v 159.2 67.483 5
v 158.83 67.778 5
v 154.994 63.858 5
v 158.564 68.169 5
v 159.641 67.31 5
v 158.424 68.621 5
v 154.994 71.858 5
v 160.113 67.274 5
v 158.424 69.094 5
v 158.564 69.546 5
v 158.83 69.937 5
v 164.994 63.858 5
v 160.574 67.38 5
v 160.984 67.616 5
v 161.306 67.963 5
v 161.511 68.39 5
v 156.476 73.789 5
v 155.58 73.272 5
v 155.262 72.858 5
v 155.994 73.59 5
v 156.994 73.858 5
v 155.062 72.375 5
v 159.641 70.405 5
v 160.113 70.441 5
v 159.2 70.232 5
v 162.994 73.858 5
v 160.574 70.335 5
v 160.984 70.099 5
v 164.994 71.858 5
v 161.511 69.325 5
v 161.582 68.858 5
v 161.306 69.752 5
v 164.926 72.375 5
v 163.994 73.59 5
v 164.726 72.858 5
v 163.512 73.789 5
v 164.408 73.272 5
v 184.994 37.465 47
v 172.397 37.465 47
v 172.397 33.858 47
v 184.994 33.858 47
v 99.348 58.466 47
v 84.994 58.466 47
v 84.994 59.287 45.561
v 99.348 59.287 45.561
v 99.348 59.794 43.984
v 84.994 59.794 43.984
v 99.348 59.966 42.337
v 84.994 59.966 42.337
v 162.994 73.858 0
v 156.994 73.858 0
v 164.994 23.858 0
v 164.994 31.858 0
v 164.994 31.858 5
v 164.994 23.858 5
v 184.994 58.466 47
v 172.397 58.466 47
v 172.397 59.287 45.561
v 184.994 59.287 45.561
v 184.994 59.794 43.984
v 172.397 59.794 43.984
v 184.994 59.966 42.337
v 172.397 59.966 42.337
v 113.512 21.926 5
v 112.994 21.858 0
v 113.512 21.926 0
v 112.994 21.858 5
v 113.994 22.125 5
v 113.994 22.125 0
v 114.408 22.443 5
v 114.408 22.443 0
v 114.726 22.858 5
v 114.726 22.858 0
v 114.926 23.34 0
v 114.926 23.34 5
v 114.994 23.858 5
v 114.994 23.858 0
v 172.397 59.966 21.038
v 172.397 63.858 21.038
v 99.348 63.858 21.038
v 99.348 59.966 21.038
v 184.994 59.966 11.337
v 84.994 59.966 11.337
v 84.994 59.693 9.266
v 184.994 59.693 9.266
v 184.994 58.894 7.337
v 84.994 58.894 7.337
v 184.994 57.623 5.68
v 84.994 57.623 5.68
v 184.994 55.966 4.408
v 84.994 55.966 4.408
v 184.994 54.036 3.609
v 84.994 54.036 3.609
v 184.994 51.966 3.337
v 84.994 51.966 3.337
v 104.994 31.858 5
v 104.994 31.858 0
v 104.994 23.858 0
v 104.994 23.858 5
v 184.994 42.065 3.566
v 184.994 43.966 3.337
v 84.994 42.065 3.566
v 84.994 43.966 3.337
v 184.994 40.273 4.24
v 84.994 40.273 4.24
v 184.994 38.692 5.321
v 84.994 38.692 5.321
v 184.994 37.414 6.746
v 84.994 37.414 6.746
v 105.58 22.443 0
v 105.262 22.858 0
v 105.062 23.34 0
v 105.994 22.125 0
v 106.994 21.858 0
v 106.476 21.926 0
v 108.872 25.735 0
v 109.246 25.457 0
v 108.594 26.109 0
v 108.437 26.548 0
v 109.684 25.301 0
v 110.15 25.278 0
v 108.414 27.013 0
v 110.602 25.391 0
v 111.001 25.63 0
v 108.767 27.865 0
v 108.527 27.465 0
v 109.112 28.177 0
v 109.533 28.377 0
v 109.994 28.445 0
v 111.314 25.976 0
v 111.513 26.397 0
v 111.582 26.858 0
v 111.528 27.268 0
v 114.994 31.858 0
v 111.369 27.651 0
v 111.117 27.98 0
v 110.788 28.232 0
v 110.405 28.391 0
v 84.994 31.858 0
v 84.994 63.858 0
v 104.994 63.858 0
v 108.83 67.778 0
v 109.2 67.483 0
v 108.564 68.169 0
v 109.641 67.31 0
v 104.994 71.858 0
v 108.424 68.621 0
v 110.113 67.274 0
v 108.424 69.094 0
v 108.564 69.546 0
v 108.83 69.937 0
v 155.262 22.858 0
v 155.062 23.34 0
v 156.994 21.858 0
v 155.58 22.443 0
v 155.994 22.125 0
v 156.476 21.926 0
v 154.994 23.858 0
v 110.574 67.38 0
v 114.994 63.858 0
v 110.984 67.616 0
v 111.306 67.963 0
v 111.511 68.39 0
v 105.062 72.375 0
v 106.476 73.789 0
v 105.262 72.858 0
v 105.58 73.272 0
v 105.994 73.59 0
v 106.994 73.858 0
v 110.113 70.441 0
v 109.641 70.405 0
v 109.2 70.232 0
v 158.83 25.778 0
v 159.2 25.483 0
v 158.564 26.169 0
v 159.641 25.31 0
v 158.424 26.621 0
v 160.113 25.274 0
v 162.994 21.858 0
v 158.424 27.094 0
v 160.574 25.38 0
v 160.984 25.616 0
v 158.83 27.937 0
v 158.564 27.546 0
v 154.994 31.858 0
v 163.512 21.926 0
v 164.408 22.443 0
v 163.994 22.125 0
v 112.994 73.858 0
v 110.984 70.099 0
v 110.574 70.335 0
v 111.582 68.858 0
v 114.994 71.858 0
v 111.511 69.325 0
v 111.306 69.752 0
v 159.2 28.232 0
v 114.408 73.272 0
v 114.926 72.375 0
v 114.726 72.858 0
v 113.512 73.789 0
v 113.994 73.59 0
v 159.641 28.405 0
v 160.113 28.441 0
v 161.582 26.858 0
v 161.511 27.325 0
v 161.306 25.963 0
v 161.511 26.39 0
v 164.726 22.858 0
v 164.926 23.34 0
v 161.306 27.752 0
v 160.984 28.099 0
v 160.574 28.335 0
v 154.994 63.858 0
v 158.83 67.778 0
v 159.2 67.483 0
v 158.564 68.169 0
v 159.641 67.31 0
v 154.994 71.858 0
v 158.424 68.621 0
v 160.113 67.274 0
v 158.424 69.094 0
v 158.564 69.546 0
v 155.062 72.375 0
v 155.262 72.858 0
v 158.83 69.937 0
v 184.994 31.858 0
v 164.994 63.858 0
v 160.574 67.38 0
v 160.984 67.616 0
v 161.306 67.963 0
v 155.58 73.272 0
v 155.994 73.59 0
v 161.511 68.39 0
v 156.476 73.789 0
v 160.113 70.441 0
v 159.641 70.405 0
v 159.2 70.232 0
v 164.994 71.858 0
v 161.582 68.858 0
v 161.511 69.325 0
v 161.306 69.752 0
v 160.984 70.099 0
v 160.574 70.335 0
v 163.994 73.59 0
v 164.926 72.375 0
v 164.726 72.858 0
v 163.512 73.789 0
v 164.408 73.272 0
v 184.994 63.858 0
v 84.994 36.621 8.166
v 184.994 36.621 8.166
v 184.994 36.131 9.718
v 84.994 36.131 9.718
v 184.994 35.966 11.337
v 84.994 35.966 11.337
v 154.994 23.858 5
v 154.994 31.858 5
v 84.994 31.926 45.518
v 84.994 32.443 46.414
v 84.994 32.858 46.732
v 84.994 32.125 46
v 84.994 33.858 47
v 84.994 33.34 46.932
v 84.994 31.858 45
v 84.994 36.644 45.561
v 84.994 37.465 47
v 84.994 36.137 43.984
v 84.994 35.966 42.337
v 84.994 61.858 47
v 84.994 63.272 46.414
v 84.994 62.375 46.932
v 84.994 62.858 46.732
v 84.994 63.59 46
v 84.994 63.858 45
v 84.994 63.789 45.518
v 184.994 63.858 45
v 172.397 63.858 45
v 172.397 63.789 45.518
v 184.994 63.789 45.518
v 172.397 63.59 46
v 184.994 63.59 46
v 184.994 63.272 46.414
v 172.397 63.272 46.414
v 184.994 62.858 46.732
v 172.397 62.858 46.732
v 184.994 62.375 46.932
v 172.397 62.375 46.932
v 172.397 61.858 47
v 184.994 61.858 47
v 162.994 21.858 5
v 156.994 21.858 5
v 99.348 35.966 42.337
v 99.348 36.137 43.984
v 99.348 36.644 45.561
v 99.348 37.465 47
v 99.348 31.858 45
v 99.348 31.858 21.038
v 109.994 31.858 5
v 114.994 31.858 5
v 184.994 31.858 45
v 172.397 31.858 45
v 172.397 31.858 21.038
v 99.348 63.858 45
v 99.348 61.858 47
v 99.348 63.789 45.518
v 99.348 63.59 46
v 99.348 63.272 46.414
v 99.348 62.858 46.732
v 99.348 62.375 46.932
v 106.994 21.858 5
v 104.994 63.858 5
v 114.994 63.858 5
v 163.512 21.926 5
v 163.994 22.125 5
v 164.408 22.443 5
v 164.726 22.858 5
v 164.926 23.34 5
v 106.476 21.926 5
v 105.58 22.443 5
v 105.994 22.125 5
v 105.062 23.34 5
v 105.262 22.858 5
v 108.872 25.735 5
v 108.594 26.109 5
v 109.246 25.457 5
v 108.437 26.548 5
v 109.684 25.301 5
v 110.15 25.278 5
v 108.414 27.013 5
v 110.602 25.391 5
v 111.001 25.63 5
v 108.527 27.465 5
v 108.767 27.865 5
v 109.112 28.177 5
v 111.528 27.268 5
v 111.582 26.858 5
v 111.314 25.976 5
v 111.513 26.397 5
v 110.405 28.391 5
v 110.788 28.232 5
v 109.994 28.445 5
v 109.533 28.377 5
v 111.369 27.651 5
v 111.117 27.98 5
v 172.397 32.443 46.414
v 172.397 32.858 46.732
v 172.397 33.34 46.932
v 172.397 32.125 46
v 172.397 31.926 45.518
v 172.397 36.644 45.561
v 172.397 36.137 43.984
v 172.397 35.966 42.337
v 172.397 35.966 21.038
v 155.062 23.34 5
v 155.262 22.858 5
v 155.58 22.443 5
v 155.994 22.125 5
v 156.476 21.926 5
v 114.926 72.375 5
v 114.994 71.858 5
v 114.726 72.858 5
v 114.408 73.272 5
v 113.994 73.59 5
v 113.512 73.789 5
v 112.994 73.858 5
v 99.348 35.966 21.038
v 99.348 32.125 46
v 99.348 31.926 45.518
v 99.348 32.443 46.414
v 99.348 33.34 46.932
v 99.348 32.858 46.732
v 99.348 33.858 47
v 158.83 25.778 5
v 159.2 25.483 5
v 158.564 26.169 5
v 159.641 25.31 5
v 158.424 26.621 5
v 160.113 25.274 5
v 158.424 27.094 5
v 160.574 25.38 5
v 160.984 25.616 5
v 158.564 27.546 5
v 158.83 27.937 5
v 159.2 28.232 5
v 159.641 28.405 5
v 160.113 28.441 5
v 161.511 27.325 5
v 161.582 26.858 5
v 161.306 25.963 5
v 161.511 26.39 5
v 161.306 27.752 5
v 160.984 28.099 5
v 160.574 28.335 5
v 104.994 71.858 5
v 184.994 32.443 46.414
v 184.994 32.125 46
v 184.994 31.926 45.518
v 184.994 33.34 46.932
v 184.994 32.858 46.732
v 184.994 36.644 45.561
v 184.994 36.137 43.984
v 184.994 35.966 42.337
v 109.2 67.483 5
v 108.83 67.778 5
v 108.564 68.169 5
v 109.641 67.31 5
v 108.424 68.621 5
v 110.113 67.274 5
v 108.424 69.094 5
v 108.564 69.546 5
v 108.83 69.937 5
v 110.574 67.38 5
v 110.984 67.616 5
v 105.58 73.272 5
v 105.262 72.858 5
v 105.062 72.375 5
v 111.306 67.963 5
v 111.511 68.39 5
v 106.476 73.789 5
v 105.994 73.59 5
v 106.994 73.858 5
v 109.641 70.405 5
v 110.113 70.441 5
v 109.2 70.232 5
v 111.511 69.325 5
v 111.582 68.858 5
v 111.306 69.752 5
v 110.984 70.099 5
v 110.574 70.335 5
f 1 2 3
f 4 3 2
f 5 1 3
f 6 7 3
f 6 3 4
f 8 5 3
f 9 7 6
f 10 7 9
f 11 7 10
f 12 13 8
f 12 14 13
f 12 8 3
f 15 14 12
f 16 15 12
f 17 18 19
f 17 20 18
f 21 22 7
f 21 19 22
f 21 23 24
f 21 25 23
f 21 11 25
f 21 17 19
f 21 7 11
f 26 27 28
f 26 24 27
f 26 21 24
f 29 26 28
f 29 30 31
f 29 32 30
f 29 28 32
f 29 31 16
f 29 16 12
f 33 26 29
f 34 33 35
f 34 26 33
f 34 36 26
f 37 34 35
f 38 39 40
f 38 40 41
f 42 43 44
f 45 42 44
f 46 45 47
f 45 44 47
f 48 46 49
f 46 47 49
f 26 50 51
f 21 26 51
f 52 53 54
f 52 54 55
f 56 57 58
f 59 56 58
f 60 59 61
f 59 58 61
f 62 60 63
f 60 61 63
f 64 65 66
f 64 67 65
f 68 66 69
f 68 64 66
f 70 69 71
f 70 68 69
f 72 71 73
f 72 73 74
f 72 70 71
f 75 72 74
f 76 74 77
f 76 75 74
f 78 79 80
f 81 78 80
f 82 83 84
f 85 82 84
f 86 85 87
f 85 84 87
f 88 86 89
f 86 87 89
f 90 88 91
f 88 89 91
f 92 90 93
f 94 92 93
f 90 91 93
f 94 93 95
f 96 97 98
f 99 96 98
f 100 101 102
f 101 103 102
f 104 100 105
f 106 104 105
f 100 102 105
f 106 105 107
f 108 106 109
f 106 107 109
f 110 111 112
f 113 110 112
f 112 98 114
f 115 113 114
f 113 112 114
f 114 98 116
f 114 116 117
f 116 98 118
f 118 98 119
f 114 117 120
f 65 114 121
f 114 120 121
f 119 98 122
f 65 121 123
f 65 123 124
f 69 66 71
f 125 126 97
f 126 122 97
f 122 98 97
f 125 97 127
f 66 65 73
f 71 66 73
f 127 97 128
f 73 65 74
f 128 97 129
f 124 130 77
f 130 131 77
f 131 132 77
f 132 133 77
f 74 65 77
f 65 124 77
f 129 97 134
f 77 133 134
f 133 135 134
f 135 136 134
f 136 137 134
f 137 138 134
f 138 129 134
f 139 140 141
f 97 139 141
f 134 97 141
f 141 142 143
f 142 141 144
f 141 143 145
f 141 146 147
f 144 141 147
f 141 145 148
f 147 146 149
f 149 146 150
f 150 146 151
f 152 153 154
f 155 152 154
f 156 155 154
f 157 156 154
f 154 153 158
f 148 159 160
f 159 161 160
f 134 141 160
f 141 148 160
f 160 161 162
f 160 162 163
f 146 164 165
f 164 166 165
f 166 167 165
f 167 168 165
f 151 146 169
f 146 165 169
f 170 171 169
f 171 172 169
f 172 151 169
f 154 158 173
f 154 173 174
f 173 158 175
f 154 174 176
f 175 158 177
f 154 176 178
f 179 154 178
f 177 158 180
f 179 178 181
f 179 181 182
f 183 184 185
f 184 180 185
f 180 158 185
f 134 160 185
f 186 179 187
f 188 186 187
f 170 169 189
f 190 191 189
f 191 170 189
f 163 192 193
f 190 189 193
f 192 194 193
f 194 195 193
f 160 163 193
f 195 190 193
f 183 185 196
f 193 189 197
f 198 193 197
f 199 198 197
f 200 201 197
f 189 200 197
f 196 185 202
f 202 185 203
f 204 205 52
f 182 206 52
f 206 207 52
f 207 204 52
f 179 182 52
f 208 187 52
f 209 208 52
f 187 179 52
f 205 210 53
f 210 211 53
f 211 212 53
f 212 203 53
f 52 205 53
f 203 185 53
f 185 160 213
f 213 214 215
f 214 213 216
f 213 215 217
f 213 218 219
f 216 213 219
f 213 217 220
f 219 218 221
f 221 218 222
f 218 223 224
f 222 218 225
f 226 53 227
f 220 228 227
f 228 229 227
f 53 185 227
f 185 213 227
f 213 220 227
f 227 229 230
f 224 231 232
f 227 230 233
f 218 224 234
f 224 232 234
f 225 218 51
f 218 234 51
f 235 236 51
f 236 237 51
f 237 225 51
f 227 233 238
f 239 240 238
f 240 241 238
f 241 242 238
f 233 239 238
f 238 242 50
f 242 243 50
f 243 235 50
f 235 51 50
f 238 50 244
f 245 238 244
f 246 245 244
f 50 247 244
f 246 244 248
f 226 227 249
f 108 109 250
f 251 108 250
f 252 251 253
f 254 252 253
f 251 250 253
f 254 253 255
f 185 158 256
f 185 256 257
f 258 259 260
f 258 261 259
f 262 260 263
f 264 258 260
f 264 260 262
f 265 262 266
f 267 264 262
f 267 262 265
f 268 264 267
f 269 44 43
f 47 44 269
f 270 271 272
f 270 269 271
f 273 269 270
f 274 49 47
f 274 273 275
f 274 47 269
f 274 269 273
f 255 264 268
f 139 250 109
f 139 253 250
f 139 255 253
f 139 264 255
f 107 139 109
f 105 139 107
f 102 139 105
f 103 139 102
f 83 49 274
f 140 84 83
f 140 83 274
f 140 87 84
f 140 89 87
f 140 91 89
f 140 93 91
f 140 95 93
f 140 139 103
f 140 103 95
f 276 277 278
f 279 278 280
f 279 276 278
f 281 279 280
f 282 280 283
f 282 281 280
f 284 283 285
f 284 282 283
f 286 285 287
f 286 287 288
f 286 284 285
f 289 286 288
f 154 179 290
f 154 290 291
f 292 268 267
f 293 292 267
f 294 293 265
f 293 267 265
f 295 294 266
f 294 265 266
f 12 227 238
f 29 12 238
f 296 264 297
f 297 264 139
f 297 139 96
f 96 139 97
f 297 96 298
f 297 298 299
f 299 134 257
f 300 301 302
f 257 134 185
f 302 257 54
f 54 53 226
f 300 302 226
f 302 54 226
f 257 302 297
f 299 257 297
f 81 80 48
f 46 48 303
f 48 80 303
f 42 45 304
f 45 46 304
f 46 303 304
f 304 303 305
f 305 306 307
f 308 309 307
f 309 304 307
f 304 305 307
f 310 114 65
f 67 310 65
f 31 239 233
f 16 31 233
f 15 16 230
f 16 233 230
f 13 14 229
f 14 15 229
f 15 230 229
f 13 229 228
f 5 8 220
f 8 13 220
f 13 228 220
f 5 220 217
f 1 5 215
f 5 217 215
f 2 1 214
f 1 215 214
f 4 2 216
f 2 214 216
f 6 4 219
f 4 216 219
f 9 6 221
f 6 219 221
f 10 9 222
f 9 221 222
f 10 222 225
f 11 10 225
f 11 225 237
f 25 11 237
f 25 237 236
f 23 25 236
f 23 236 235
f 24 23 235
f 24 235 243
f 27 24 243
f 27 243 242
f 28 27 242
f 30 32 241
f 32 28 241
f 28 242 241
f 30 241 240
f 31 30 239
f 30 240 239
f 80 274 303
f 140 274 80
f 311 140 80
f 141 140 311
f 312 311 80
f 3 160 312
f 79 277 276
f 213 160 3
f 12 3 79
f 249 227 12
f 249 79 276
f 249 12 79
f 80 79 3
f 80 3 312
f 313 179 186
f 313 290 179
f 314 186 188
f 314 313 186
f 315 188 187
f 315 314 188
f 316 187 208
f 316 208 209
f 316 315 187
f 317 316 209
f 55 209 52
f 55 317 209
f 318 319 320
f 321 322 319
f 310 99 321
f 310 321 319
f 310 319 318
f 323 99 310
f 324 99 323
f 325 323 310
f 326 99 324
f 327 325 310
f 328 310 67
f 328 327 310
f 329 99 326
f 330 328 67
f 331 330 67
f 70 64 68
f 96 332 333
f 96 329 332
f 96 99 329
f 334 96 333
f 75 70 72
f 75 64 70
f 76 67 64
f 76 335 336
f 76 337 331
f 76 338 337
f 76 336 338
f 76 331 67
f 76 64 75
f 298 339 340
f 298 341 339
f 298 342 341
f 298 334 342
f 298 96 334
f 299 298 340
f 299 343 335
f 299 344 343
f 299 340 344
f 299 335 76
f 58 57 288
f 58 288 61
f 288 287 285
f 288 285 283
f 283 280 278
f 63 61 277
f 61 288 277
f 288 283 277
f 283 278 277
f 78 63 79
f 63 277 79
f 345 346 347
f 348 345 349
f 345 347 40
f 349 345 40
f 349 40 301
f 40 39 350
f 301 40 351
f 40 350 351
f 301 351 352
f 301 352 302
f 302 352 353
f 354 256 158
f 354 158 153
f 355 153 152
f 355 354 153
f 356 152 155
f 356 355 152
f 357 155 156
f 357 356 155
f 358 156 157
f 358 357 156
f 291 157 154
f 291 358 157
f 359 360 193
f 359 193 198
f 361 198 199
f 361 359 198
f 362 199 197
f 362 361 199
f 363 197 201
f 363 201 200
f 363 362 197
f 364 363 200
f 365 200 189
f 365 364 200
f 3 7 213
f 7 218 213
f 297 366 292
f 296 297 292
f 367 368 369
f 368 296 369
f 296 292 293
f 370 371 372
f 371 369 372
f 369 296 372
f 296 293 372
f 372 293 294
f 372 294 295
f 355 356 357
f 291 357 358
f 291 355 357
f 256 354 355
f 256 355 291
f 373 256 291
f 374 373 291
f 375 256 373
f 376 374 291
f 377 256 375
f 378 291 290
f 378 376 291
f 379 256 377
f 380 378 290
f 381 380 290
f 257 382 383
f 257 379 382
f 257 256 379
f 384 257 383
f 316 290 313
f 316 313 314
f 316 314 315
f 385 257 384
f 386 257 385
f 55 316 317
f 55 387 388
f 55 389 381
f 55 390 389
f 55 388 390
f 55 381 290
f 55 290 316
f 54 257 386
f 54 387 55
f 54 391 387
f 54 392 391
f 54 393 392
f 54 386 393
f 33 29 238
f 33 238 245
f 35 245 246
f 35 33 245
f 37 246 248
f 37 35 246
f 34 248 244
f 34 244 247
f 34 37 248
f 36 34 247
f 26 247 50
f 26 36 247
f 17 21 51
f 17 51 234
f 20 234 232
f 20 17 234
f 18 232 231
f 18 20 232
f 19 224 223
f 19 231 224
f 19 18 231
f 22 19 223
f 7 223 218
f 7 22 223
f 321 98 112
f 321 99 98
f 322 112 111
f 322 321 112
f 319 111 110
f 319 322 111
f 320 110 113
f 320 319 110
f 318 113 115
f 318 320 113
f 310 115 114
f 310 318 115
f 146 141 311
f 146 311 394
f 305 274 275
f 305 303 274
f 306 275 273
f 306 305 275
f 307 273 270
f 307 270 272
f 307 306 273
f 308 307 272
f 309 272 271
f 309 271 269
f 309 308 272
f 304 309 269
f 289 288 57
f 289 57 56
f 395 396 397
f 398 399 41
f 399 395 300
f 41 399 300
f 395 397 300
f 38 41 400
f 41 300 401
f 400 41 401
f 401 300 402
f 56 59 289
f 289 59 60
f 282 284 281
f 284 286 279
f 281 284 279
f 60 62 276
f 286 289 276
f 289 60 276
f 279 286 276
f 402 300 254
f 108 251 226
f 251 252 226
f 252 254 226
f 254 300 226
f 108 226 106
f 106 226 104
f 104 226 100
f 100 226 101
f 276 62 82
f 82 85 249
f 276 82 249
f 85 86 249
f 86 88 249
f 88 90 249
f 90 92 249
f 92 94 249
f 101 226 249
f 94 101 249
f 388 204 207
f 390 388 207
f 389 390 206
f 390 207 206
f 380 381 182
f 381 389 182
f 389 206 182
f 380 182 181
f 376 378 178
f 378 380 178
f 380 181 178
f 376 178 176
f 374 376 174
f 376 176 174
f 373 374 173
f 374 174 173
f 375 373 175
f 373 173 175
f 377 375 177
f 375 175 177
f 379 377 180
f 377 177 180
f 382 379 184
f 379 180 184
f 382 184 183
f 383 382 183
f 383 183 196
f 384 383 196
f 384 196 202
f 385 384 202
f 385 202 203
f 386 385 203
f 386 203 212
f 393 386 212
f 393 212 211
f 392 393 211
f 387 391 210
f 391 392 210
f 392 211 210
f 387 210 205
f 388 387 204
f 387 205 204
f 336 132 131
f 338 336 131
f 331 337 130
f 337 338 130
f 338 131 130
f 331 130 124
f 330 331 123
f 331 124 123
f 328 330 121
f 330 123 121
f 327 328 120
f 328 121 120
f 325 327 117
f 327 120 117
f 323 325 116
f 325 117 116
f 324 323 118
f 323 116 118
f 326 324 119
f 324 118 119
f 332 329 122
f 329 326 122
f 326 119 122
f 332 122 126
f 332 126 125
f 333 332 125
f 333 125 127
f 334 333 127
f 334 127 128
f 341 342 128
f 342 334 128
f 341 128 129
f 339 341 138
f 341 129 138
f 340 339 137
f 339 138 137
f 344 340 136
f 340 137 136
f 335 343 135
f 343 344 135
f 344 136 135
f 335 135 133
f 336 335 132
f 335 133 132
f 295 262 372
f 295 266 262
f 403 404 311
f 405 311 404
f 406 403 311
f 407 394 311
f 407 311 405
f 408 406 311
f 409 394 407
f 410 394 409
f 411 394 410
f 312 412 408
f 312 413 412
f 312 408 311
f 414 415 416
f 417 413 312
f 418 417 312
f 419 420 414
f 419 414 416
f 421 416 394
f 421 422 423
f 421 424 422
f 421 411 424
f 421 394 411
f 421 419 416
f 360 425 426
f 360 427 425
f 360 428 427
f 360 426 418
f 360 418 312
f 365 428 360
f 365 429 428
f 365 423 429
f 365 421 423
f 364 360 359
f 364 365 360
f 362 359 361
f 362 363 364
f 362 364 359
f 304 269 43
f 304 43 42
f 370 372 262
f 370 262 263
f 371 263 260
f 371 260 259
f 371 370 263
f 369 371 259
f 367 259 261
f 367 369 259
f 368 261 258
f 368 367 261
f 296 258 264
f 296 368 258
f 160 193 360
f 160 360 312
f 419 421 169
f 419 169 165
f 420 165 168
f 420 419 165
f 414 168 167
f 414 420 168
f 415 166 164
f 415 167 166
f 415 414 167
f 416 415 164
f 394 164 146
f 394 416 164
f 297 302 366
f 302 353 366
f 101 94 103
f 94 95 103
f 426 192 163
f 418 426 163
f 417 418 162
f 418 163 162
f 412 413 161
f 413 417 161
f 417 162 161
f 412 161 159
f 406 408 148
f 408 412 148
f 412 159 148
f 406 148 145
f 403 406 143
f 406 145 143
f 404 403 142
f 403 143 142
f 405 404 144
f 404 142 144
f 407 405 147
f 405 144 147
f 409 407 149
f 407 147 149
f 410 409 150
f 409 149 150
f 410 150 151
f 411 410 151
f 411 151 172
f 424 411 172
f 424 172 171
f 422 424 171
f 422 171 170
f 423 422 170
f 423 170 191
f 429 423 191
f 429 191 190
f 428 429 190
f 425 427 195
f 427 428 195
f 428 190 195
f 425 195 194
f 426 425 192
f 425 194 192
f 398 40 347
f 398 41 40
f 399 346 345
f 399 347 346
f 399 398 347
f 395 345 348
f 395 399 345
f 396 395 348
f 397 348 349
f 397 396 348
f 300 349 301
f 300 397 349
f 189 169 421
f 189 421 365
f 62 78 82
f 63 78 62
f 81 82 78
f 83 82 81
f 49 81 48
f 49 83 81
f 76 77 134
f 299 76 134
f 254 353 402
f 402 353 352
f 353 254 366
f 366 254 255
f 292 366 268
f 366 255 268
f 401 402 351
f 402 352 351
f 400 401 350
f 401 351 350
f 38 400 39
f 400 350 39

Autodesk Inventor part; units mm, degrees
ref_plane "YZ Plane" through (0, 0, 0) normal (1, 0, 0) x (0, 1, 0)
sketch "Sketch1" plane through (0, 0, 0) normal (0, 0, 1) x (1, 0, 0)
  line L0 (29.367, 37.7153) -> (29.0801, 37.3058)
  arc A0 (25.6709, 43.8574) -> (29.0801, 37.3058) centre (33.6709, 43.8574) ccw
  line L1 (25.6709, 51.8574) -> (25.6709, 43.8574)
  line L2 (25.6709, 43.8574) -> (25.6709, 51.8574)
  arc A1 (33.6709, 59.8574) -> (25.6709, 51.8574) centre (33.6709, 51.8574) ccw
  line L3 (33.6709, 59.8574) -> (64.6709, 59.8574)
  arc A2 (72.6709, 51.8574) -> (64.6709, 59.8574) centre (64.6709, 51.8574) ccw
  line L4 (72.6709, 43.8574) -> (72.6709, 51.8574)
  line L5 (72.6709, 51.8576) -> (72.6709, 43.8574)
  arc A3 (64.6709, 35.8574) -> (72.6709, 43.8574) centre (64.6709, 43.8574) ccw
  arc A4 (33.6709, 59.8574) -> (25.6709, 51.8574) centre (33.6709, 51.8574) ccw
  arc A5 (25.6709, 43.8574) -> (33.6709, 35.8574) centre (33.6709, 43.8574) ccw
  arc A6 (64.6709, 35.8574) -> (72.6709, 43.8574) centre (64.6709, 43.8574) ccw
  arc A7 (72.6709, 51.8574) -> (64.6709, 59.8574) centre (64.6709, 51.8574) ccw
  line L6 (33.6709, 35.8574) -> (64.6709, 35.8574)
  line L7 (33.6709, 35.8574) -> (50.3633, 35.8574)
  line L8 (50.3633, 59.8574) -> (50.3633, 35.8574)
  line L9 (25.6709, 47.8574) -> (50.3633, 47.8574)
  line L10 (84.9941, 47.8575) -> (84.9941, 63.8575)
  line L11 (84.9941, 63.8575) -> (184.9941, 63.8575)
  line L12 (84.9941, 47.8575) -> (84.9941, 31.8575)
  line L13 (84.9941, 31.8575) -> (184.9941, 31.8575)
  line L14 (184.9941, 31.8575) -> (184.9941, 63.8575)
  line L15 (184.9941, 31.8575) -> (164.9941, 31.8575)
  line L16 (164.9941, 31.8575) -> (164.9941, 21.8575)
  line L17 (164.9941, 21.8575) -> (154.9941, 21.8575)
  line L18 (154.9941, 21.8575) -> (154.9941, 31.8575)
  line L19 (84.9941, 31.8575) -> (104.9941, 31.8575)
  line L20 (104.9941, 31.8575) -> (104.9941, 21.8575)
  line L21 (104.9941, 21.8575) -> (114.9941, 21.8575)
  line L22 (114.9941, 21.8575) -> (114.9941, 31.8575)
  line L23 (184.9941, 63.8575) -> (164.9941, 63.8575)
  line L24 (164.9941, 63.8575) -> (164.9941, 73.8575)
  line L25 (164.9941, 73.8575) -> (154.9941, 73.8575)
  line L26 (154.9941, 73.8575) -> (154.9941, 63.8575)
  line L27 (84.9941, 63.8575) -> (104.9941, 63.8575)
  line L28 (104.9941, 63.8575) -> (104.9941, 73.8575)
  line L29 (104.9941, 73.8575) -> (114.9941, 73.8575)
  line L30 (114.9941, 73.8575) -> (114.9941, 63.8575)
  line L31 (104.9941, 63.8575) -> (109.9941, 63.8575)
  line L32 (104.9941, 31.8575) -> (109.9941, 31.8575)
  line L33 (104.9941, 31.8575) -> (109.9941, 31.8575)
  line L34 (109.9941, 26.8575) -> (109.9941, 31.8575)
  line L35 (154.9941, 63.8575) -> (159.9941, 63.8575)
  line L36 (154.9941, 31.8575) -> (159.9941, 31.8575)
  circle A8 centre (109.9941, 68.8575) radius 1.5875
  circle A9 centre (159.9941, 68.8575) radius 1.5875
  circle A10 centre (109.9941, 26.8575) radius 1.5875
  circle A11 centre (159.9941, 26.8575) radius 1.5875
  point P0 (0, 0)
sketch "Sketch2" plane through (0, 0, 0) normal (0, 0, 1) x (1, 0, 0)
  line L0 (29.367, 37.7153) -> (29.0801, 37.3058)
  arc A0 (25.6709, 43.8574) -> (29.0801, 37.3058) centre (33.6709, 43.8574) ccw
  line L1 (25.6709, 51.8574) -> (25.6709, 43.8574)
  line L2 (25.6709, 43.8574) -> (25.6709, 51.8574)
  arc A1 (33.6709, 59.8574) -> (25.6709, 51.8574) centre (33.6709, 51.8574) ccw
  line L3 (33.6709, 59.8574) -> (64.6709, 59.8574)
  arc A2 (72.6709, 51.8574) -> (64.6709, 59.8574) centre (64.6709, 51.8574) ccw
  line L4 (72.6709, 43.8574) -> (72.6709, 51.8574)
  line L5 (72.6709, 51.8576) -> (72.6709, 43.8574)
  arc A3 (64.6709, 35.8574) -> (72.6709, 43.8574) centre (64.6709, 43.8574) ccw
  arc A4 (33.6709, 59.8574) -> (25.6709, 51.8574) centre (33.6709, 51.8574) ccw
  arc A5 (25.6709, 43.8574) -> (33.6709, 35.8574) centre (33.6709, 43.8574) ccw
  arc A6 (64.6709, 35.8574) -> (72.6709, 43.8574) centre (64.6709, 43.8574) ccw
  arc A7 (72.6709, 51.8574) -> (64.6709, 59.8574) centre (64.6709, 51.8574) ccw
  line L6 (33.6709, 35.8574) -> (64.6709, 35.8574)
  line L7 (33.6709, 35.8574) -> (50.3633, 35.8574)
  line L8 (50.3633, 59.8574) -> (50.3633, 35.8574)
  line L9 (25.6709, 47.8574) -> (50.3633, 47.8574)
  line L10 (84.9941, 47.8575) -> (84.9941, 63.8575)
  line L11 (84.9941, 63.8575) -> (184.9941, 63.8575)
  line L12 (84.9941, 47.8575) -> (84.9941, 31.8575)
  line L13 (84.9941, 31.8575) -> (184.9941, 31.8575)
  line L14 (184.9941, 31.8575) -> (184.9941, 63.8575)
  line L15 (184.9941, 31.8575) -> (164.9941, 31.8575)
  line L16 (164.9941, 31.8575) -> (164.9941, 21.8575)
  line L17 (164.9941, 21.8575) -> (154.9941, 21.8575)
  line L18 (154.9941, 21.8575) -> (154.9941, 31.8575)
  line L19 (84.9941, 31.8575) -> (104.9941, 31.8575)
  line L20 (104.9941, 31.8575) -> (104.9941, 21.8575)
  line L21 (104.9941, 21.8575) -> (114.9941, 21.8575)
  line L22 (114.9941, 21.8575) -> (114.9941, 31.8575)
  line L23 (184.9941, 63.8575) -> (164.9941, 63.8575)
  line L24 (164.9941, 63.8575) -> (164.9941, 73.8575)
  line L25 (164.9941, 73.8575) -> (154.9941, 73.8575)
  line L26 (154.9941, 73.8575) -> (154.9941, 63.8575)
  line L27 (84.9941, 63.8575) -> (104.9941, 63.8575)
  line L28 (104.9941, 63.8575) -> (104.9941, 73.8575)
  line L29 (104.9941, 73.8575) -> (114.9941, 73.8575)
  line L30 (114.9941, 73.8575) -> (114.9941, 63.8575)
  line L31 (104.9941, 63.8575) -> (109.9941, 63.8575)
  line L32 (104.9941, 31.8575) -> (109.9941, 31.8575)
  line L33 (104.9941, 31.8575) -> (109.9941, 31.8575)
  line L34 (109.9941, 26.8575) -> (109.9941, 31.8575)
  line L35 (154.9941, 63.8575) -> (159.9941, 63.8575)
  line L36 (154.9941, 31.8575) -> (159.9941, 31.8575)
  circle A8 centre (109.9941, 68.8575) radius 1.5875
  circle A9 centre (159.9941, 68.8575) radius 1.5875
  circle A10 centre (109.9941, 26.8575) radius 1.5875
  circle A11 centre (159.9941, 26.8575) radius 1.5875
  point P0 (0, 0)
extrude "Extrusion1" add sketch "Sketch1" along normal blind 47 contours L10 L11 L14 L13 L12
extrude "Extrusion2" add sketch "Sketch2" along normal blind 5 contours L28 L29 L30 L11 | L13 L22 L21 L20 | L26 L25 L24 L11 | L13 L16 L17 L18
ref_plane "Work Plane1" through (84.9941, 63.8575, 47) normal (0, 1, 0) x (1, 0, 0)
sketch "Sketch3" plane through (84.9941, 63.8575, 47) normal (0, 1, 0) x (1, 0, 0)
  point P0 (-84.9941, 47)
ref_plane "Work Plane2" through (84.9941, 31.8575, 0) normal (-1, 0, 0) x (0, 0, 1)
sketch "Sketch4" plane through (84.9941, 31.8575, 0) normal (-1, 0, 0) x (0, 0, 1)
  line L0 (7.0327, 5.966) -> (6.7458, 5.5565)
  arc A0 (3.3366, 12.1082) -> (6.7458, 5.5565) centre (11.3366, 12.1082) ccw
  line L1 (3.3366, 20.1082) -> (3.3366, 12.1082)
  line L2 (3.3366, 12.1082) -> (3.3366, 20.1082)
  arc A1 (11.3366, 28.1082) -> (3.3366, 20.1082) centre (11.3366, 20.1082) ccw
  line L3 (11.3366, 28.1082) -> (42.3366, 28.1082)
  arc A2 (50.3366, 20.1082) -> (42.3366, 28.1082) centre (42.3366, 20.1082) ccw
  line L4 (50.3366, 12.1082) -> (50.3366, 20.1082)
  line L5 (50.3366, 20.1083) -> (50.3366, 12.1082)
  arc A3 (42.3366, 4.1082) -> (50.3366, 12.1082) centre (42.3366, 12.1082) ccw
  arc A4 (11.3366, 28.1082) -> (3.3366, 20.1082) centre (11.3366, 20.1082) ccw
  arc A5 (3.3366, 12.1082) -> (11.3366, 4.1082) centre (11.3366, 12.1082) ccw
  arc A6 (42.3366, 4.1082) -> (50.3366, 12.1082) centre (42.3366, 12.1082) ccw
  arc A7 (50.3366, 20.1082) -> (42.3366, 28.1082) centre (42.3366, 20.1082) ccw
  line L6 (11.3366, 4.1082) -> (42.3366, 4.1082)
  line L7 (11.3366, 4.1082) -> (28.029, 4.1082)
  line L8 (28.029, 28.1082) -> (28.029, 4.1082)
  line L9 (3.3366, 16.1082) -> (28.029, 16.1082)
  point P0 (0, -31.8575)
  point P1 (50.3366, 20.1082)
extrude "Extrusion3" cut sketch "Sketch4" against normal blind 110
sketch "Sketch5" plane through (84.9941, 63.8575, 47) normal (0, 1, 0) x (1, 0, 0)
  line L0 (14.3535, -16.4072) -> (87.4033, -16.4072)
  line L1 (87.4033, -16.4072) -> (87.4033, 25.9617)
  line L2 (87.4033, 25.9617) -> (14.3535, 25.9617)
  line L3 (14.3535, 25.9617) -> (14.3535, -16.4072)
  point P0 (-84.9941, 47)
extrude "Extrusion4" cut sketch "Sketch5" against normal blind 40
fillet "Fillet1" radius 2 4 edges at (92.1709, 63.8575, 47) (178.6957, 63.8575, 47) (178.6957, 31.8575, 47) (92.1709, 31.8575, 47)
fillet "Fillet2" radius 2 8 edges at (164.9941, 73.8575, 2.5) (154.9941, 73.8575, 2.5) (114.9941, 73.8575, 2.5) (104.9941, 73.8575, 2.5) (164.9941, 21.8575, 2.5) (154.9941, 21.8575, 2.5) (114.9941, 21.8575, 2.5) (104.9941, 21.8575, 2.5)
properties part number "Porta pilas"
